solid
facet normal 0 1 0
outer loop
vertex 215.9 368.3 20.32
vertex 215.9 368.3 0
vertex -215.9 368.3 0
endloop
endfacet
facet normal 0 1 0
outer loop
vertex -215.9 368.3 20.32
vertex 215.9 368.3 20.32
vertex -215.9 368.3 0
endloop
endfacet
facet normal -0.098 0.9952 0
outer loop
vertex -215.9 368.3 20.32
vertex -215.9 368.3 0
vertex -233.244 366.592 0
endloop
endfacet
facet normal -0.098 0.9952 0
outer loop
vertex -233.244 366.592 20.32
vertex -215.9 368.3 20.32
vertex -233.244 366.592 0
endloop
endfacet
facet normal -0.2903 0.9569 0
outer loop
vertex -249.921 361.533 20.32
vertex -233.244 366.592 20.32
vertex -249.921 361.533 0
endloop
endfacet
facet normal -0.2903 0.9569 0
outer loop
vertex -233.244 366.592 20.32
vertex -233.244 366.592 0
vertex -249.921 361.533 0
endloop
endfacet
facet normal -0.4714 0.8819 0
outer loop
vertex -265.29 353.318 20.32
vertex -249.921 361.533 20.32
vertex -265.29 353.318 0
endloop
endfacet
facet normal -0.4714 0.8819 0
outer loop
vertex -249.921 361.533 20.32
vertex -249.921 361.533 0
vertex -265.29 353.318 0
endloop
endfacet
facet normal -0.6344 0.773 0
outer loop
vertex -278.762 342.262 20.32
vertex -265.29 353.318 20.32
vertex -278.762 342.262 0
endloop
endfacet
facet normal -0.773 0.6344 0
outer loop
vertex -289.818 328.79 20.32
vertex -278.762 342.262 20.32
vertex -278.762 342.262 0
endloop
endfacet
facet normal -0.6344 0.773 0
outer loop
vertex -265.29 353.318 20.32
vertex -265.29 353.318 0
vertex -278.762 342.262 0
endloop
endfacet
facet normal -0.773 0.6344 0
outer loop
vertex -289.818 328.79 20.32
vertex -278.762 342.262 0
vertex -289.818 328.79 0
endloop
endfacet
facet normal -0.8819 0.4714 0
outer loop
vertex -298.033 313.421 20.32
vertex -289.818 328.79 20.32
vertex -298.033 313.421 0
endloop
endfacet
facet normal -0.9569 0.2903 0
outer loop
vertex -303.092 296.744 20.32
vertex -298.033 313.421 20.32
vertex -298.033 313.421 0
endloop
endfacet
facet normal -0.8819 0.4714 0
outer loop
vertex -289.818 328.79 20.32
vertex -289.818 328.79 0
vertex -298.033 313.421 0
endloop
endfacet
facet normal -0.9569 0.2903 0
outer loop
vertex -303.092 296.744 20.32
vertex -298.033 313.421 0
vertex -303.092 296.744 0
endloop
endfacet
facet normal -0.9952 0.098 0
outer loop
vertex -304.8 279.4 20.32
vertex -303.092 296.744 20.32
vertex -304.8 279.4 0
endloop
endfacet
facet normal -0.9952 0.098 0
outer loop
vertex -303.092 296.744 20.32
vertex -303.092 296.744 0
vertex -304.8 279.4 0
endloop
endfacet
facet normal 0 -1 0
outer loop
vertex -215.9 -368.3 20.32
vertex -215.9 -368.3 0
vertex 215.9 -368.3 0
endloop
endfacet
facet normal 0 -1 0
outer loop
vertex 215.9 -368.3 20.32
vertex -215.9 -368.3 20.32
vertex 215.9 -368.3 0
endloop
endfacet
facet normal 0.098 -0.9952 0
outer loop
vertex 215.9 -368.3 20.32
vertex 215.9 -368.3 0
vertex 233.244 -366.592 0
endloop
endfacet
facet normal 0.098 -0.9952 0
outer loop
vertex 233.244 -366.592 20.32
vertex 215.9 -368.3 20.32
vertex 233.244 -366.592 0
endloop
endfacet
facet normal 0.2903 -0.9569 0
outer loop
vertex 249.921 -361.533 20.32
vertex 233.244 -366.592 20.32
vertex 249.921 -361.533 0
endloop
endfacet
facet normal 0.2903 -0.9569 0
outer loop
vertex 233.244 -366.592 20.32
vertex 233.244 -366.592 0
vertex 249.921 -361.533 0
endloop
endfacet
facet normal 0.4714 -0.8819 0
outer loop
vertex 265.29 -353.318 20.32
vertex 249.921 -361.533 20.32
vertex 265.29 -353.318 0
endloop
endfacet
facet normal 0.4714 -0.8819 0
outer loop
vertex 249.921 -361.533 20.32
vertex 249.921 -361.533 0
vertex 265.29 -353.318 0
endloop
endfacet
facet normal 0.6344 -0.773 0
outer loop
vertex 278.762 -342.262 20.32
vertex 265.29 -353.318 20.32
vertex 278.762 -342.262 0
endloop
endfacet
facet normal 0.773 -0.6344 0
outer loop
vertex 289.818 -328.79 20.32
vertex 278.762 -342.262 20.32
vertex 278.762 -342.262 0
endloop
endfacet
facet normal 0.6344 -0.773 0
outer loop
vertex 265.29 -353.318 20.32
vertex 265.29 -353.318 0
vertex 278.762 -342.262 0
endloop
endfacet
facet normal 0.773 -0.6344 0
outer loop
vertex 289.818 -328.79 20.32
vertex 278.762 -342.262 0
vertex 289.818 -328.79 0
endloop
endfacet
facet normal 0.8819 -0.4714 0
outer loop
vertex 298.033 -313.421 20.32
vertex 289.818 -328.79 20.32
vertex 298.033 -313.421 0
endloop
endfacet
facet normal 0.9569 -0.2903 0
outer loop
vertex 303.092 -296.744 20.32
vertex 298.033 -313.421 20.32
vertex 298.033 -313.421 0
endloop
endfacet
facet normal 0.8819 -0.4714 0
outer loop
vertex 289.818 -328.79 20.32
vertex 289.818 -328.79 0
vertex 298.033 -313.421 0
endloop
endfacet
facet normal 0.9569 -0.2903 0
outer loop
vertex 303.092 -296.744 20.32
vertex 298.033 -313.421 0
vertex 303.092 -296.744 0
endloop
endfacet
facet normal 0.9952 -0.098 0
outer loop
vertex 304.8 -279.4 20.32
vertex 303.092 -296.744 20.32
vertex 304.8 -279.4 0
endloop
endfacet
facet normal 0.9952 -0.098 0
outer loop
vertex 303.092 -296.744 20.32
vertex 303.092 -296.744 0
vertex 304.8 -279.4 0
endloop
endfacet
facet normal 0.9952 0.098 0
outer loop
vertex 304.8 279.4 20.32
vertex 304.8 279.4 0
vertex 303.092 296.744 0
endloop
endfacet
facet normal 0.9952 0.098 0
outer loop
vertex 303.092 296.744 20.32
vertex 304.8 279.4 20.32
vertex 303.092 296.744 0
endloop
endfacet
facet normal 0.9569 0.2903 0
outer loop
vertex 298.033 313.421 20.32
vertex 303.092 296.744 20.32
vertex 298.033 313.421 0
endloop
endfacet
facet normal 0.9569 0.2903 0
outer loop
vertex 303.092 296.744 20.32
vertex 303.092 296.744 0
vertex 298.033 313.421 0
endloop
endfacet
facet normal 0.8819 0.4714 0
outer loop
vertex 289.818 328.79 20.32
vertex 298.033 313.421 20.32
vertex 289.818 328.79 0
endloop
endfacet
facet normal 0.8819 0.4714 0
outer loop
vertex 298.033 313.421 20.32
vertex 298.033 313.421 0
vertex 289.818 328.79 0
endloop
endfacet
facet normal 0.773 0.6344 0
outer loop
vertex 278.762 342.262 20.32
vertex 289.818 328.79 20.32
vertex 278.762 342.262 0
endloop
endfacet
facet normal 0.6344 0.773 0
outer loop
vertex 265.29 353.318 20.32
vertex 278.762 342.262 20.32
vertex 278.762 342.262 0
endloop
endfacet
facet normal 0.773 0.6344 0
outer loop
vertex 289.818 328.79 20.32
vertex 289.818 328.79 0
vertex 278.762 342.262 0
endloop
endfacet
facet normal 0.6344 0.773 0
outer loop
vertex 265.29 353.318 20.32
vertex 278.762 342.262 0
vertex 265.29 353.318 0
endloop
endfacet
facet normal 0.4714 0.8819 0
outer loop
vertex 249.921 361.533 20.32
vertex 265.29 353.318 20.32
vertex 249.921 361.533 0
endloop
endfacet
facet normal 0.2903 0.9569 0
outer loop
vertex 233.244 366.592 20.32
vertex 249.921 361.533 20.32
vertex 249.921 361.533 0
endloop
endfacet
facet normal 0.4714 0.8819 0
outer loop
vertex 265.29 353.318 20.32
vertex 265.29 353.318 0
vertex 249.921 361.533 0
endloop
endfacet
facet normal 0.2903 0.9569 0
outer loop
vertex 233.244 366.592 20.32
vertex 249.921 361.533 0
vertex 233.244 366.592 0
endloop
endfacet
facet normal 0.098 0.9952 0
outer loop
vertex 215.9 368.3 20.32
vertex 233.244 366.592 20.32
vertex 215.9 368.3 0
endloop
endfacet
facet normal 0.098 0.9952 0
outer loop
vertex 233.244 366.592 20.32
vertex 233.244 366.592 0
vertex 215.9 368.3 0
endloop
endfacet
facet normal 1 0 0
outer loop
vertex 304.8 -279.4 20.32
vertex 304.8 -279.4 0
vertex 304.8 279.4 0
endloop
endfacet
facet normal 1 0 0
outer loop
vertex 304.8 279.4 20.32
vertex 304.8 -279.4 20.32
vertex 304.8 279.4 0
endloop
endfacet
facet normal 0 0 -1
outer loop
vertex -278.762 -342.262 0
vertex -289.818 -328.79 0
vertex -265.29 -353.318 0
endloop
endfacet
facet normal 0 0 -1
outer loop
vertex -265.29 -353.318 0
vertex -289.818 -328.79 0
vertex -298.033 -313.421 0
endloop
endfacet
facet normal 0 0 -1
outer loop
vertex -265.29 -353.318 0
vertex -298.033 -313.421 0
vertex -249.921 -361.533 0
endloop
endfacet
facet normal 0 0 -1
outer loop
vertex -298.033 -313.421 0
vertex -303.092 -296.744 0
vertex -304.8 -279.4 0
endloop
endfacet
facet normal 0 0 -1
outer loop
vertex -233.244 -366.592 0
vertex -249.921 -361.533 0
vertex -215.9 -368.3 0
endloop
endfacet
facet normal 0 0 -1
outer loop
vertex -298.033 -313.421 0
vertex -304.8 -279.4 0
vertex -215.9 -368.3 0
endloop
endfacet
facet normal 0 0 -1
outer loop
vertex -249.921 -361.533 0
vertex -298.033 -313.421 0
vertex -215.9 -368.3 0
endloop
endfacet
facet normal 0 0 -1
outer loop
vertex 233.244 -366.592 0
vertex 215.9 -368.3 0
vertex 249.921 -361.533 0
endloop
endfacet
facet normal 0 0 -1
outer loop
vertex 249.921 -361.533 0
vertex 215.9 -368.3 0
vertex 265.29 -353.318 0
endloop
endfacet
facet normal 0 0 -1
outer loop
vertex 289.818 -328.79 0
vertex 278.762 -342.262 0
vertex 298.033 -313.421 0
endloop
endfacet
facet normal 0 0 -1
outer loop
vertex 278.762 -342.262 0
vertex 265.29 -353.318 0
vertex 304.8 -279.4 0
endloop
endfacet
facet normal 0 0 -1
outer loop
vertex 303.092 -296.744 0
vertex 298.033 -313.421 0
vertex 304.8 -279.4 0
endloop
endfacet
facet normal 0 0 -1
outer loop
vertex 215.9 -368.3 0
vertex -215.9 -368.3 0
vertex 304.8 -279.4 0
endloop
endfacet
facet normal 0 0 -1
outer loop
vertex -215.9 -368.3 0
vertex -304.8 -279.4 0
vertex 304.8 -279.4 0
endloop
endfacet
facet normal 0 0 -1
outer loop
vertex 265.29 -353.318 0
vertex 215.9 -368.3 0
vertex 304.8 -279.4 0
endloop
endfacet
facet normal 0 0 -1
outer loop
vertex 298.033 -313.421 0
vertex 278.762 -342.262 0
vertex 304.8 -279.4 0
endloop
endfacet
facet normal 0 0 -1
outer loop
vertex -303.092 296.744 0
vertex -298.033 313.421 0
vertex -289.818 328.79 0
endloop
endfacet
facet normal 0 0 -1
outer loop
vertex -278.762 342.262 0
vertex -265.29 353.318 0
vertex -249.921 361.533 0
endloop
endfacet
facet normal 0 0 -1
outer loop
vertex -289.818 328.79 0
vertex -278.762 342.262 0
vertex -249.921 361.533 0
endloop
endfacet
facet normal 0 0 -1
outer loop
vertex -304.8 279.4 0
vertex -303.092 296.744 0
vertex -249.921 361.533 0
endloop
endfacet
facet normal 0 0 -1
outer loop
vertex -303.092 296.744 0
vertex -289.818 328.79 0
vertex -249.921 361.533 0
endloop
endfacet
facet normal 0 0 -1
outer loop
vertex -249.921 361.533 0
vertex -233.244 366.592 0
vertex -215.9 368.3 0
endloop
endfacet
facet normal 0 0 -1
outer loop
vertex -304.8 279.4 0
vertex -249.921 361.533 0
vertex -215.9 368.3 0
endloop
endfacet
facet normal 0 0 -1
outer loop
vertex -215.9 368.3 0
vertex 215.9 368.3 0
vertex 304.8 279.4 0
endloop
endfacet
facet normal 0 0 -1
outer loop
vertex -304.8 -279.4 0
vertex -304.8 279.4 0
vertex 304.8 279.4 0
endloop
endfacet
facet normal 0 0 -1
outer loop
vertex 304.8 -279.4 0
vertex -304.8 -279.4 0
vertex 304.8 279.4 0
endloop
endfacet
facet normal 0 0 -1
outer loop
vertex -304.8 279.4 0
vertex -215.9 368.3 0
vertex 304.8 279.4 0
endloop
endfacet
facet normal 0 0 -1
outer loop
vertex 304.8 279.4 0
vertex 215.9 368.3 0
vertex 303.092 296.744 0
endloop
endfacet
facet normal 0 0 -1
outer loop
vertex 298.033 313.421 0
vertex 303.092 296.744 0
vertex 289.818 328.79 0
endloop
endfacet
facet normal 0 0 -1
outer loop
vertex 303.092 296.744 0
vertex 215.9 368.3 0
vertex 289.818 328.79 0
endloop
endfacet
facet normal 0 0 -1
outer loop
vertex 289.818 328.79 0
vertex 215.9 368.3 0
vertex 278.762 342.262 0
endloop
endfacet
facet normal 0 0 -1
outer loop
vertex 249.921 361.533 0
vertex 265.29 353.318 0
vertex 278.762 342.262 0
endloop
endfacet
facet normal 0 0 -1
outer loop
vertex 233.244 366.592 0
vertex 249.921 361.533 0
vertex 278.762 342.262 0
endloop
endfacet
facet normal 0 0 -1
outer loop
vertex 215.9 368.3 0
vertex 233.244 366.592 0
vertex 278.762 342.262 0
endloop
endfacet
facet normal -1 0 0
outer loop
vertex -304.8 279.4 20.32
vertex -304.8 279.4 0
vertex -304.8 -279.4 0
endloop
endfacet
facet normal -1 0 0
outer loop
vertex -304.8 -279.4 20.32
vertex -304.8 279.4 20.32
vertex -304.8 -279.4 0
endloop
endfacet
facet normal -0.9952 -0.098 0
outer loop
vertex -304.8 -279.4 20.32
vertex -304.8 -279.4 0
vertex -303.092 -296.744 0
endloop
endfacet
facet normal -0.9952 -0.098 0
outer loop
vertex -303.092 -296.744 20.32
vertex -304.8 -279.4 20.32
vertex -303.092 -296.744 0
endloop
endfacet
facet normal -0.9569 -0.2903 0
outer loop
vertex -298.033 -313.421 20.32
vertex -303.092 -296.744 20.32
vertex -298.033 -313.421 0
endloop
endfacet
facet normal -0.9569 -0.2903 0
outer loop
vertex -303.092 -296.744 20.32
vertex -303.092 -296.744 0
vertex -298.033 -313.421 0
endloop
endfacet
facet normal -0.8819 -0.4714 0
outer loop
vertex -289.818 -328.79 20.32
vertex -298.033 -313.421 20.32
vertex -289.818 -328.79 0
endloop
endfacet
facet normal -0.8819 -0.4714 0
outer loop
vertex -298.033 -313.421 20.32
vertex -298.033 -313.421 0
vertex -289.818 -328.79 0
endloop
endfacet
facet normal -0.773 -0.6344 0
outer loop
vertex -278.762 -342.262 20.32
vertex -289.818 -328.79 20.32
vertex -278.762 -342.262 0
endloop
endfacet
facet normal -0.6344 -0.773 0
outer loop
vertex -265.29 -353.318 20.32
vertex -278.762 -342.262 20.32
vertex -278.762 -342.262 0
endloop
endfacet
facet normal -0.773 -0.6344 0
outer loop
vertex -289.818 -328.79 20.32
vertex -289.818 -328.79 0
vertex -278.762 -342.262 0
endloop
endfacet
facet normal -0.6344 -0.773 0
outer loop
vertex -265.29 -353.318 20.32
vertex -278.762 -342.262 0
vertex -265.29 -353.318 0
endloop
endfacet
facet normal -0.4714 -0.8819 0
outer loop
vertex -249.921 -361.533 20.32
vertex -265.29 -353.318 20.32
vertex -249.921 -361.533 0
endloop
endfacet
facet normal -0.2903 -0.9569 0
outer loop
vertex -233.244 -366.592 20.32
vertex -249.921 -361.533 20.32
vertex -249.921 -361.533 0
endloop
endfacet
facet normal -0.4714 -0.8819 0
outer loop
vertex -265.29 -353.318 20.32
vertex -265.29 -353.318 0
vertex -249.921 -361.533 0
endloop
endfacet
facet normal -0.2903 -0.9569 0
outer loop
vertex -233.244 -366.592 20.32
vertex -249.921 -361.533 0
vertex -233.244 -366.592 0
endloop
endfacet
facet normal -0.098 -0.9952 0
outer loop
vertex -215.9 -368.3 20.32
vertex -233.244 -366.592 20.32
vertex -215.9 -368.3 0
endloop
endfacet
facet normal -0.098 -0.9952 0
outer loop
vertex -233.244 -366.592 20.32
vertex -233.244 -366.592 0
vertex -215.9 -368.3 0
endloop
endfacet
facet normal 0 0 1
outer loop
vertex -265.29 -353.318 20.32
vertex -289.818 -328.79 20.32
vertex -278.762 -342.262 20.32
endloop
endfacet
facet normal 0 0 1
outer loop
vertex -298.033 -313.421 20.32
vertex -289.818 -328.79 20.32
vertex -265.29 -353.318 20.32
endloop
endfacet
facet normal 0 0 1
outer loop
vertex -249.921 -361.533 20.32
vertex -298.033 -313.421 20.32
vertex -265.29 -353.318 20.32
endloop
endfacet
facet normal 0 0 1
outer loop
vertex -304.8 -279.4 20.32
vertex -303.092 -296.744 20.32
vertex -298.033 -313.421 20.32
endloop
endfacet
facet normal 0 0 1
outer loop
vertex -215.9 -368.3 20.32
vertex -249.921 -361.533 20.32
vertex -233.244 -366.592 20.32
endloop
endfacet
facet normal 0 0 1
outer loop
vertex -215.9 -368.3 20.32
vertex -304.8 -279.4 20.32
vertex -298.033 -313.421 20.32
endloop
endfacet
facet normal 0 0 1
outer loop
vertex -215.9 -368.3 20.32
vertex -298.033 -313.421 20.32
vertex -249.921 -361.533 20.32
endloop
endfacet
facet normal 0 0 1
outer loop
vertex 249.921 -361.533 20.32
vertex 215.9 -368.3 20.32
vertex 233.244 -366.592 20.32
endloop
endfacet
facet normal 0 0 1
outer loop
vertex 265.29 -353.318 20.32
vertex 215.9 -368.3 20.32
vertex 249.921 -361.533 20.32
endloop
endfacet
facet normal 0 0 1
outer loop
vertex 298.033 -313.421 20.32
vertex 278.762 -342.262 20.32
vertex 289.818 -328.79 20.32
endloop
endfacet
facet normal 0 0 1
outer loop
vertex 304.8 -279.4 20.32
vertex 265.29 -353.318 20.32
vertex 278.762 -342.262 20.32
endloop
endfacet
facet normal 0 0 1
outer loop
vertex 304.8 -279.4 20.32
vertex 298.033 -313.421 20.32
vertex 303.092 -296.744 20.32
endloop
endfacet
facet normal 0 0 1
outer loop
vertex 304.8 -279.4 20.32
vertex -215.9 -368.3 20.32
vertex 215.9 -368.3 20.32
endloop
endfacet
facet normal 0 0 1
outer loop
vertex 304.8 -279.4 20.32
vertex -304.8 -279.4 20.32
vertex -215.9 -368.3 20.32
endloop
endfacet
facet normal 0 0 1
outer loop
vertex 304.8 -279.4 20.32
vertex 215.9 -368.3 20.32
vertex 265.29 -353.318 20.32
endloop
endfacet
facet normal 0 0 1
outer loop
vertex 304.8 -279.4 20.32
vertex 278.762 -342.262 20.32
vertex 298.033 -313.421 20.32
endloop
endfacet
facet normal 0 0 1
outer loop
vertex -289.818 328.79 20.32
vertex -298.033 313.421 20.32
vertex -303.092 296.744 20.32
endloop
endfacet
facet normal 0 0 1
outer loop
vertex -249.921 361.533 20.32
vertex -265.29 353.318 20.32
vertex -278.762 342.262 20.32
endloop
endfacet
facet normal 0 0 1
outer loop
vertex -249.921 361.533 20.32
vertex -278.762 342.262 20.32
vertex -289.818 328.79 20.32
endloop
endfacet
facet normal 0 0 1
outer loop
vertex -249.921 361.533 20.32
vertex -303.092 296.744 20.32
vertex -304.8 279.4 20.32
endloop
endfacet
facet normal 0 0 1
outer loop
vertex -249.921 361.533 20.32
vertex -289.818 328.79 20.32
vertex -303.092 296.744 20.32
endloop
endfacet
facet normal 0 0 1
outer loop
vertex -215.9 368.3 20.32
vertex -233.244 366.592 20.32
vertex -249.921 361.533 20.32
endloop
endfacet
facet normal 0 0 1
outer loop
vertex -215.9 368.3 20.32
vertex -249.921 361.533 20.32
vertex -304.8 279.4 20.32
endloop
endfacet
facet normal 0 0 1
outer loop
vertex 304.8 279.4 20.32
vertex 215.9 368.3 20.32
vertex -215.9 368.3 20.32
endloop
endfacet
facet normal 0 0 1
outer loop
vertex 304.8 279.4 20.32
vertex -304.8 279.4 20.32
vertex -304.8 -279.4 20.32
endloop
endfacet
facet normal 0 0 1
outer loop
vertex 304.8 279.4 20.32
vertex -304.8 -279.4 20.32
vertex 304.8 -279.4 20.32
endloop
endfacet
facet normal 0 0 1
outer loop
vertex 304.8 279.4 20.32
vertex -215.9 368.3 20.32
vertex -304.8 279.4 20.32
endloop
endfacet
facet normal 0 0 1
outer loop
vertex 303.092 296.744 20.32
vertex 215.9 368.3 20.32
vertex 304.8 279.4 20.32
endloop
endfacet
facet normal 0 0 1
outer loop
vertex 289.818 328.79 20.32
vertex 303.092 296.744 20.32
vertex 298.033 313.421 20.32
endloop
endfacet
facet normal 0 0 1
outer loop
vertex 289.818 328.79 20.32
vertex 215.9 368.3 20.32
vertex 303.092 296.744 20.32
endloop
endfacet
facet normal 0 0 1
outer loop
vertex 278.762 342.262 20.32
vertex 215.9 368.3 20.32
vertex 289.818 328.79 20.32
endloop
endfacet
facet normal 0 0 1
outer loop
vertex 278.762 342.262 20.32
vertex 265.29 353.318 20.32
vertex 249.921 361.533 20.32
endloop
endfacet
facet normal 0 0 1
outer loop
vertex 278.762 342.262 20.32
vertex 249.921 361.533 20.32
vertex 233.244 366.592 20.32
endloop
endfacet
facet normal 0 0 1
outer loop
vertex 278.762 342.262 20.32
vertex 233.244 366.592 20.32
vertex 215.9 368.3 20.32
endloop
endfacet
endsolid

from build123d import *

# Parameters (mm, degrees)
F1_DEPTH = 20.32


with BuildPart() as f1:
    # F0 (on Top) → F1 (new body)
    with BuildSketch(Plane.XY):
        with BuildLine():
            Line((190.5, -368.3), (215.9, -368.3))
            ThreePointArc((215.9, -368.3), (278.761793, -342.261793), (304.8, -279.4))
            Line((304.8, -279.4), (304.8, 279.4))
            ThreePointArc((304.8, 279.4), (278.761793, 342.261793), (215.9, 368.3))
            Line((215.9, 368.3), (-215.9, 368.3))
            ThreePointArc((-215.9, 368.3), (-278.761793, 342.261793), (-304.8, 279.4))
            Line((-304.8, 279.4), (-304.8, -279.4))
            ThreePointArc((-304.8, -279.4), (-278.761793, -342.261793), (-215.9, -368.3))
            Line((-215.9, -368.3), (-190.5, -368.3))
            Line((-190.5, -368.3), (190.5, -368.3))
        make_face()
    extrude(amount=F1_DEPTH)


solid = f1.part
